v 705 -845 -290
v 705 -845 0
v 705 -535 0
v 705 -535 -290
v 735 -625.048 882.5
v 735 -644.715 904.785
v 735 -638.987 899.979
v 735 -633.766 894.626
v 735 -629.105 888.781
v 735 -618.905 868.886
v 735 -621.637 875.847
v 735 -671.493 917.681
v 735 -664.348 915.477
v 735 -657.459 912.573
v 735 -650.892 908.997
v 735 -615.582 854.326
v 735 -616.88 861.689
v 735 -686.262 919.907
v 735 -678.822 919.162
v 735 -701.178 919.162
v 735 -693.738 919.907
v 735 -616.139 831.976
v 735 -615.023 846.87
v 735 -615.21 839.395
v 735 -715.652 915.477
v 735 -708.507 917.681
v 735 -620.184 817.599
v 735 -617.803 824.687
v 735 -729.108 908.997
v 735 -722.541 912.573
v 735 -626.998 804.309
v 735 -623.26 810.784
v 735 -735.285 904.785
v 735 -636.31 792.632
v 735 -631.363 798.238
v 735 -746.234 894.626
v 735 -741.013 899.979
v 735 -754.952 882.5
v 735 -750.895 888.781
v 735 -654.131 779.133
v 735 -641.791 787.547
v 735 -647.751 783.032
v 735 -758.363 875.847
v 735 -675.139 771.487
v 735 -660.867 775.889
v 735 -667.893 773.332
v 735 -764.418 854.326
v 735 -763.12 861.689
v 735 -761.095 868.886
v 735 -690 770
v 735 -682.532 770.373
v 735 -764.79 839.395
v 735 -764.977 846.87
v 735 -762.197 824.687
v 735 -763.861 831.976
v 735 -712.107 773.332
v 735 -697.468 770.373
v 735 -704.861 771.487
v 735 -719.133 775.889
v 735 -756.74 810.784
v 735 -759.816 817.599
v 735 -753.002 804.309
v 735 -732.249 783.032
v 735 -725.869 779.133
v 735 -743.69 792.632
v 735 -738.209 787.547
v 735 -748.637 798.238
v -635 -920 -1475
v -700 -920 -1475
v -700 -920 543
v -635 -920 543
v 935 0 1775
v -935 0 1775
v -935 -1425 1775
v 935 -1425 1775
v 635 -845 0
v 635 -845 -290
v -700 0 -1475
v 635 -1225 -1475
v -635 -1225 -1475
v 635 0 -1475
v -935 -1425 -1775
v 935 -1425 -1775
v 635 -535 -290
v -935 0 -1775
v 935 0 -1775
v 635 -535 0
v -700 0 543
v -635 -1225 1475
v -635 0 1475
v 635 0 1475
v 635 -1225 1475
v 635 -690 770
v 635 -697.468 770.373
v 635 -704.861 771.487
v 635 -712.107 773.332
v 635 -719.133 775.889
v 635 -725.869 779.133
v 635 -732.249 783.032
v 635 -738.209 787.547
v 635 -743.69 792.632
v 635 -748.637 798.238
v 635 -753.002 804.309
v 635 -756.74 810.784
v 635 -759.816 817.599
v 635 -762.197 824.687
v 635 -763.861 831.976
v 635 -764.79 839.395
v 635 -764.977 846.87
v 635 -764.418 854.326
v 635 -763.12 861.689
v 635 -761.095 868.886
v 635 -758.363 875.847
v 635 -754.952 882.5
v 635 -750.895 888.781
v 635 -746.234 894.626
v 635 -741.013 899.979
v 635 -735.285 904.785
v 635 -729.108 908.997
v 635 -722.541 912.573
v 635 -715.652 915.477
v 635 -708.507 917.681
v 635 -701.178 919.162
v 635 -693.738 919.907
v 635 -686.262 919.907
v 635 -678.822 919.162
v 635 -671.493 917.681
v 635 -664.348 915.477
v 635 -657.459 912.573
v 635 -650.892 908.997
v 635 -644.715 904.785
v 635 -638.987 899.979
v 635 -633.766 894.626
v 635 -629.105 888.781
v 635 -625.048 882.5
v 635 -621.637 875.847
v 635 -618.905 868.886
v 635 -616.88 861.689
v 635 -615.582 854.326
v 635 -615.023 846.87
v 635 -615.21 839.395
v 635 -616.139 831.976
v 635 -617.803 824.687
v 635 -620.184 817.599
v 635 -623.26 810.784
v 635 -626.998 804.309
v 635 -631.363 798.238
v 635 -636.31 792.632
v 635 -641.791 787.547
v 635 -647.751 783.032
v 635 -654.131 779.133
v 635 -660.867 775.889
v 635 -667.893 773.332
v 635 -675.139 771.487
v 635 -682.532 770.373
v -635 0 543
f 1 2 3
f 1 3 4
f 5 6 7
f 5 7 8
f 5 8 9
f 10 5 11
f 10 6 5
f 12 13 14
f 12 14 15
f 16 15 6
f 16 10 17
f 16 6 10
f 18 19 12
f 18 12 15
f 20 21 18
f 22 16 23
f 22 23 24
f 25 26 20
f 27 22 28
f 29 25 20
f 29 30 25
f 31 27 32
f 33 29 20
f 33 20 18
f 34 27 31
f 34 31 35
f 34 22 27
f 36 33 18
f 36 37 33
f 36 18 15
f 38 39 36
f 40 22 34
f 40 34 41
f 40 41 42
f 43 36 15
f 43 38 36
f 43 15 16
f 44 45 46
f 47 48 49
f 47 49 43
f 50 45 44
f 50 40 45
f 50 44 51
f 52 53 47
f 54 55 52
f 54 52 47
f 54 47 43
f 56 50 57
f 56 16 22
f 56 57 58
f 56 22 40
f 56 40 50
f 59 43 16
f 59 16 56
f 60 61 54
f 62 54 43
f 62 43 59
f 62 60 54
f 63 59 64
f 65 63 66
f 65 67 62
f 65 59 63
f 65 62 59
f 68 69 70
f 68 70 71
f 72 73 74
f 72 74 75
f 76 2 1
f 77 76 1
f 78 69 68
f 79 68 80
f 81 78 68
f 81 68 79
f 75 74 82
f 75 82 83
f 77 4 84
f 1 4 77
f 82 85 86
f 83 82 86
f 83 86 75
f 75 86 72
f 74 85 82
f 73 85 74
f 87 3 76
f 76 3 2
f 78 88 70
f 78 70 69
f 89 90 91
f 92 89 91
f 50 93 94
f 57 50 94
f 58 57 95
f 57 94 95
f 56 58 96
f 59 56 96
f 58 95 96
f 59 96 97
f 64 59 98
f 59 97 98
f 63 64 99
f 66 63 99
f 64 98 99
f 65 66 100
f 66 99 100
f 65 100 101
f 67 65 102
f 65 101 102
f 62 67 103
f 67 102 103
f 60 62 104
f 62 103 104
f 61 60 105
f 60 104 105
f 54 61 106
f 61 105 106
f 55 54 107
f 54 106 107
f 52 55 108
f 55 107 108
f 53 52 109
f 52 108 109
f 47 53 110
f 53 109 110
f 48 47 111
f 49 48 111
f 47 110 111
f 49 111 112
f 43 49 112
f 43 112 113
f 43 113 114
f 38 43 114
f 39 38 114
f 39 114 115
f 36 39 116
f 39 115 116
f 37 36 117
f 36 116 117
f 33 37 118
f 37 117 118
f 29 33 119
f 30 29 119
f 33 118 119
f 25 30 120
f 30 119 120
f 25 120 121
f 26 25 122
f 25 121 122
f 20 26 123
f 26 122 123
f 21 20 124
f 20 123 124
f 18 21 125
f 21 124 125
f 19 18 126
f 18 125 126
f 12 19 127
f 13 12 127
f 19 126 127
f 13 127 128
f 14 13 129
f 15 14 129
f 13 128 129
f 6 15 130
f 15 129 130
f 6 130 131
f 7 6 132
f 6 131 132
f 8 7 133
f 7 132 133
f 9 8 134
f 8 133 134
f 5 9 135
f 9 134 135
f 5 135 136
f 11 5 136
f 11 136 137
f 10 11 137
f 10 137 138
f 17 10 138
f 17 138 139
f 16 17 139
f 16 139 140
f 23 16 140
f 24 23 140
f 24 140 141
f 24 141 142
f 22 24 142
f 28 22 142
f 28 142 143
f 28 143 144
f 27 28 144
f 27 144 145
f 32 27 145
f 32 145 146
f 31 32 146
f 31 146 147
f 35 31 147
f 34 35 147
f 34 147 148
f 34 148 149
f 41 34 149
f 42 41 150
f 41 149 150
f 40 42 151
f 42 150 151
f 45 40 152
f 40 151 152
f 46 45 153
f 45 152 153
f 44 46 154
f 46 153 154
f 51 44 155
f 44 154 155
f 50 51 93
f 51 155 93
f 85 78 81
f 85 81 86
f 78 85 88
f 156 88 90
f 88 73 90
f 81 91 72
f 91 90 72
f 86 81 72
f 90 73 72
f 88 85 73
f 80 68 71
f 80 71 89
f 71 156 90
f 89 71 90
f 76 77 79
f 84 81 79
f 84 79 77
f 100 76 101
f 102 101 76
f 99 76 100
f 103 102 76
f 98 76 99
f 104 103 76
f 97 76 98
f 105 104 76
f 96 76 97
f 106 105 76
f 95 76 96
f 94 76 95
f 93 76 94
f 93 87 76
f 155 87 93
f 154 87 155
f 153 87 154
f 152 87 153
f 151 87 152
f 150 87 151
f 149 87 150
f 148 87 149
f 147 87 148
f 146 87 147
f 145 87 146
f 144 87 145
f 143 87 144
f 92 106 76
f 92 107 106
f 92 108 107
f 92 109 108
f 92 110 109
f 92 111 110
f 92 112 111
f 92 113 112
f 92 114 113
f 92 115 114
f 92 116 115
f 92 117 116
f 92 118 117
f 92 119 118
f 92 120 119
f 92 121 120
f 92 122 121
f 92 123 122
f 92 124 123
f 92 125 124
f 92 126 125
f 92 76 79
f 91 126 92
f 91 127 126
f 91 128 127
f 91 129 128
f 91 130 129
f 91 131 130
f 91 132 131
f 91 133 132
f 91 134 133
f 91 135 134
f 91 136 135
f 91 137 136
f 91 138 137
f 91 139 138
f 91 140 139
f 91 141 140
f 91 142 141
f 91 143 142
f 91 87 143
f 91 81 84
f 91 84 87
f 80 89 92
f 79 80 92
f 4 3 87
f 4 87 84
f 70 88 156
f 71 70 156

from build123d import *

# Parameters (mm, degrees)
SKETCH001_W     = 1870
SKETCH001_H     = 3550
SKETCH001_W_2   = 1270
SKETCH001_H_2   = 2950
PAD_DEPTH       = 1425
BINDER_W        = 1870
BINDER_H        = 3550
PAD001_DEPTH    = 200
SKETCH002_W     = 65
SKETCH002_H     = 2018
POCKET_DEPTH    = 920
BOX_W           = 290
BOX_H           = 310
BOX_DEPTH       = 70
SKETCH003_R     = 75
POCKET001_DEPTH = 100


with BuildPart() as part:
    # Sketch001 → Pad (new body)
    with BuildSketch(Plane.XZ):
        Rectangle(SKETCH001_W, SKETCH001_H)
        Rectangle(SKETCH001_W_2, SKETCH001_H_2, mode=Mode.SUBTRACT)
    extrude(amount=PAD_DEPTH)

    # Binder → Pad001 (join)
    with BuildSketch(Plane(origin=(0, -1425, 0), x_dir=(1, 0, 0), z_dir=(0, 1, 0))):
        Rectangle(BINDER_W, BINDER_H)
    extrude(amount=PAD001_DEPTH)

    # Sketch002 (on Face1 of Pad001) → Pocket (cut)
    with BuildSketch(Plane(origin=(0, 0, 0), x_dir=(1, 0, 0), z_dir=(0, 1, 0))):
        with Locations((-667.5, 466)):
            Rectangle(SKETCH002_W, SKETCH002_H)
    extrude(amount=-POCKET_DEPTH, mode=Mode.SUBTRACT)

    # Box → Box (cut)
    with BuildSketch(Plane(origin=(705, -535, 0), x_dir=(0, 0, -1), z_dir=(-1, 0, 0))):
        with Locations((145, 155)):
            Rectangle(BOX_W, BOX_H)
    extrude(amount=BOX_DEPTH, mode=Mode.SUBTRACT)

    # Sketch003 (on Face7 of Box) → Pocket001 (cut)
    with BuildSketch(Plane(origin=(635, -535, 0), x_dir=(0, 0, -1), z_dir=(-1, 0, 0))):
        with Locations((-845, 155)):
            Circle(SKETCH003_R)
    extrude(amount=-POCKET001_DEPTH, mode=Mode.SUBTRACT)


solid = part.part
